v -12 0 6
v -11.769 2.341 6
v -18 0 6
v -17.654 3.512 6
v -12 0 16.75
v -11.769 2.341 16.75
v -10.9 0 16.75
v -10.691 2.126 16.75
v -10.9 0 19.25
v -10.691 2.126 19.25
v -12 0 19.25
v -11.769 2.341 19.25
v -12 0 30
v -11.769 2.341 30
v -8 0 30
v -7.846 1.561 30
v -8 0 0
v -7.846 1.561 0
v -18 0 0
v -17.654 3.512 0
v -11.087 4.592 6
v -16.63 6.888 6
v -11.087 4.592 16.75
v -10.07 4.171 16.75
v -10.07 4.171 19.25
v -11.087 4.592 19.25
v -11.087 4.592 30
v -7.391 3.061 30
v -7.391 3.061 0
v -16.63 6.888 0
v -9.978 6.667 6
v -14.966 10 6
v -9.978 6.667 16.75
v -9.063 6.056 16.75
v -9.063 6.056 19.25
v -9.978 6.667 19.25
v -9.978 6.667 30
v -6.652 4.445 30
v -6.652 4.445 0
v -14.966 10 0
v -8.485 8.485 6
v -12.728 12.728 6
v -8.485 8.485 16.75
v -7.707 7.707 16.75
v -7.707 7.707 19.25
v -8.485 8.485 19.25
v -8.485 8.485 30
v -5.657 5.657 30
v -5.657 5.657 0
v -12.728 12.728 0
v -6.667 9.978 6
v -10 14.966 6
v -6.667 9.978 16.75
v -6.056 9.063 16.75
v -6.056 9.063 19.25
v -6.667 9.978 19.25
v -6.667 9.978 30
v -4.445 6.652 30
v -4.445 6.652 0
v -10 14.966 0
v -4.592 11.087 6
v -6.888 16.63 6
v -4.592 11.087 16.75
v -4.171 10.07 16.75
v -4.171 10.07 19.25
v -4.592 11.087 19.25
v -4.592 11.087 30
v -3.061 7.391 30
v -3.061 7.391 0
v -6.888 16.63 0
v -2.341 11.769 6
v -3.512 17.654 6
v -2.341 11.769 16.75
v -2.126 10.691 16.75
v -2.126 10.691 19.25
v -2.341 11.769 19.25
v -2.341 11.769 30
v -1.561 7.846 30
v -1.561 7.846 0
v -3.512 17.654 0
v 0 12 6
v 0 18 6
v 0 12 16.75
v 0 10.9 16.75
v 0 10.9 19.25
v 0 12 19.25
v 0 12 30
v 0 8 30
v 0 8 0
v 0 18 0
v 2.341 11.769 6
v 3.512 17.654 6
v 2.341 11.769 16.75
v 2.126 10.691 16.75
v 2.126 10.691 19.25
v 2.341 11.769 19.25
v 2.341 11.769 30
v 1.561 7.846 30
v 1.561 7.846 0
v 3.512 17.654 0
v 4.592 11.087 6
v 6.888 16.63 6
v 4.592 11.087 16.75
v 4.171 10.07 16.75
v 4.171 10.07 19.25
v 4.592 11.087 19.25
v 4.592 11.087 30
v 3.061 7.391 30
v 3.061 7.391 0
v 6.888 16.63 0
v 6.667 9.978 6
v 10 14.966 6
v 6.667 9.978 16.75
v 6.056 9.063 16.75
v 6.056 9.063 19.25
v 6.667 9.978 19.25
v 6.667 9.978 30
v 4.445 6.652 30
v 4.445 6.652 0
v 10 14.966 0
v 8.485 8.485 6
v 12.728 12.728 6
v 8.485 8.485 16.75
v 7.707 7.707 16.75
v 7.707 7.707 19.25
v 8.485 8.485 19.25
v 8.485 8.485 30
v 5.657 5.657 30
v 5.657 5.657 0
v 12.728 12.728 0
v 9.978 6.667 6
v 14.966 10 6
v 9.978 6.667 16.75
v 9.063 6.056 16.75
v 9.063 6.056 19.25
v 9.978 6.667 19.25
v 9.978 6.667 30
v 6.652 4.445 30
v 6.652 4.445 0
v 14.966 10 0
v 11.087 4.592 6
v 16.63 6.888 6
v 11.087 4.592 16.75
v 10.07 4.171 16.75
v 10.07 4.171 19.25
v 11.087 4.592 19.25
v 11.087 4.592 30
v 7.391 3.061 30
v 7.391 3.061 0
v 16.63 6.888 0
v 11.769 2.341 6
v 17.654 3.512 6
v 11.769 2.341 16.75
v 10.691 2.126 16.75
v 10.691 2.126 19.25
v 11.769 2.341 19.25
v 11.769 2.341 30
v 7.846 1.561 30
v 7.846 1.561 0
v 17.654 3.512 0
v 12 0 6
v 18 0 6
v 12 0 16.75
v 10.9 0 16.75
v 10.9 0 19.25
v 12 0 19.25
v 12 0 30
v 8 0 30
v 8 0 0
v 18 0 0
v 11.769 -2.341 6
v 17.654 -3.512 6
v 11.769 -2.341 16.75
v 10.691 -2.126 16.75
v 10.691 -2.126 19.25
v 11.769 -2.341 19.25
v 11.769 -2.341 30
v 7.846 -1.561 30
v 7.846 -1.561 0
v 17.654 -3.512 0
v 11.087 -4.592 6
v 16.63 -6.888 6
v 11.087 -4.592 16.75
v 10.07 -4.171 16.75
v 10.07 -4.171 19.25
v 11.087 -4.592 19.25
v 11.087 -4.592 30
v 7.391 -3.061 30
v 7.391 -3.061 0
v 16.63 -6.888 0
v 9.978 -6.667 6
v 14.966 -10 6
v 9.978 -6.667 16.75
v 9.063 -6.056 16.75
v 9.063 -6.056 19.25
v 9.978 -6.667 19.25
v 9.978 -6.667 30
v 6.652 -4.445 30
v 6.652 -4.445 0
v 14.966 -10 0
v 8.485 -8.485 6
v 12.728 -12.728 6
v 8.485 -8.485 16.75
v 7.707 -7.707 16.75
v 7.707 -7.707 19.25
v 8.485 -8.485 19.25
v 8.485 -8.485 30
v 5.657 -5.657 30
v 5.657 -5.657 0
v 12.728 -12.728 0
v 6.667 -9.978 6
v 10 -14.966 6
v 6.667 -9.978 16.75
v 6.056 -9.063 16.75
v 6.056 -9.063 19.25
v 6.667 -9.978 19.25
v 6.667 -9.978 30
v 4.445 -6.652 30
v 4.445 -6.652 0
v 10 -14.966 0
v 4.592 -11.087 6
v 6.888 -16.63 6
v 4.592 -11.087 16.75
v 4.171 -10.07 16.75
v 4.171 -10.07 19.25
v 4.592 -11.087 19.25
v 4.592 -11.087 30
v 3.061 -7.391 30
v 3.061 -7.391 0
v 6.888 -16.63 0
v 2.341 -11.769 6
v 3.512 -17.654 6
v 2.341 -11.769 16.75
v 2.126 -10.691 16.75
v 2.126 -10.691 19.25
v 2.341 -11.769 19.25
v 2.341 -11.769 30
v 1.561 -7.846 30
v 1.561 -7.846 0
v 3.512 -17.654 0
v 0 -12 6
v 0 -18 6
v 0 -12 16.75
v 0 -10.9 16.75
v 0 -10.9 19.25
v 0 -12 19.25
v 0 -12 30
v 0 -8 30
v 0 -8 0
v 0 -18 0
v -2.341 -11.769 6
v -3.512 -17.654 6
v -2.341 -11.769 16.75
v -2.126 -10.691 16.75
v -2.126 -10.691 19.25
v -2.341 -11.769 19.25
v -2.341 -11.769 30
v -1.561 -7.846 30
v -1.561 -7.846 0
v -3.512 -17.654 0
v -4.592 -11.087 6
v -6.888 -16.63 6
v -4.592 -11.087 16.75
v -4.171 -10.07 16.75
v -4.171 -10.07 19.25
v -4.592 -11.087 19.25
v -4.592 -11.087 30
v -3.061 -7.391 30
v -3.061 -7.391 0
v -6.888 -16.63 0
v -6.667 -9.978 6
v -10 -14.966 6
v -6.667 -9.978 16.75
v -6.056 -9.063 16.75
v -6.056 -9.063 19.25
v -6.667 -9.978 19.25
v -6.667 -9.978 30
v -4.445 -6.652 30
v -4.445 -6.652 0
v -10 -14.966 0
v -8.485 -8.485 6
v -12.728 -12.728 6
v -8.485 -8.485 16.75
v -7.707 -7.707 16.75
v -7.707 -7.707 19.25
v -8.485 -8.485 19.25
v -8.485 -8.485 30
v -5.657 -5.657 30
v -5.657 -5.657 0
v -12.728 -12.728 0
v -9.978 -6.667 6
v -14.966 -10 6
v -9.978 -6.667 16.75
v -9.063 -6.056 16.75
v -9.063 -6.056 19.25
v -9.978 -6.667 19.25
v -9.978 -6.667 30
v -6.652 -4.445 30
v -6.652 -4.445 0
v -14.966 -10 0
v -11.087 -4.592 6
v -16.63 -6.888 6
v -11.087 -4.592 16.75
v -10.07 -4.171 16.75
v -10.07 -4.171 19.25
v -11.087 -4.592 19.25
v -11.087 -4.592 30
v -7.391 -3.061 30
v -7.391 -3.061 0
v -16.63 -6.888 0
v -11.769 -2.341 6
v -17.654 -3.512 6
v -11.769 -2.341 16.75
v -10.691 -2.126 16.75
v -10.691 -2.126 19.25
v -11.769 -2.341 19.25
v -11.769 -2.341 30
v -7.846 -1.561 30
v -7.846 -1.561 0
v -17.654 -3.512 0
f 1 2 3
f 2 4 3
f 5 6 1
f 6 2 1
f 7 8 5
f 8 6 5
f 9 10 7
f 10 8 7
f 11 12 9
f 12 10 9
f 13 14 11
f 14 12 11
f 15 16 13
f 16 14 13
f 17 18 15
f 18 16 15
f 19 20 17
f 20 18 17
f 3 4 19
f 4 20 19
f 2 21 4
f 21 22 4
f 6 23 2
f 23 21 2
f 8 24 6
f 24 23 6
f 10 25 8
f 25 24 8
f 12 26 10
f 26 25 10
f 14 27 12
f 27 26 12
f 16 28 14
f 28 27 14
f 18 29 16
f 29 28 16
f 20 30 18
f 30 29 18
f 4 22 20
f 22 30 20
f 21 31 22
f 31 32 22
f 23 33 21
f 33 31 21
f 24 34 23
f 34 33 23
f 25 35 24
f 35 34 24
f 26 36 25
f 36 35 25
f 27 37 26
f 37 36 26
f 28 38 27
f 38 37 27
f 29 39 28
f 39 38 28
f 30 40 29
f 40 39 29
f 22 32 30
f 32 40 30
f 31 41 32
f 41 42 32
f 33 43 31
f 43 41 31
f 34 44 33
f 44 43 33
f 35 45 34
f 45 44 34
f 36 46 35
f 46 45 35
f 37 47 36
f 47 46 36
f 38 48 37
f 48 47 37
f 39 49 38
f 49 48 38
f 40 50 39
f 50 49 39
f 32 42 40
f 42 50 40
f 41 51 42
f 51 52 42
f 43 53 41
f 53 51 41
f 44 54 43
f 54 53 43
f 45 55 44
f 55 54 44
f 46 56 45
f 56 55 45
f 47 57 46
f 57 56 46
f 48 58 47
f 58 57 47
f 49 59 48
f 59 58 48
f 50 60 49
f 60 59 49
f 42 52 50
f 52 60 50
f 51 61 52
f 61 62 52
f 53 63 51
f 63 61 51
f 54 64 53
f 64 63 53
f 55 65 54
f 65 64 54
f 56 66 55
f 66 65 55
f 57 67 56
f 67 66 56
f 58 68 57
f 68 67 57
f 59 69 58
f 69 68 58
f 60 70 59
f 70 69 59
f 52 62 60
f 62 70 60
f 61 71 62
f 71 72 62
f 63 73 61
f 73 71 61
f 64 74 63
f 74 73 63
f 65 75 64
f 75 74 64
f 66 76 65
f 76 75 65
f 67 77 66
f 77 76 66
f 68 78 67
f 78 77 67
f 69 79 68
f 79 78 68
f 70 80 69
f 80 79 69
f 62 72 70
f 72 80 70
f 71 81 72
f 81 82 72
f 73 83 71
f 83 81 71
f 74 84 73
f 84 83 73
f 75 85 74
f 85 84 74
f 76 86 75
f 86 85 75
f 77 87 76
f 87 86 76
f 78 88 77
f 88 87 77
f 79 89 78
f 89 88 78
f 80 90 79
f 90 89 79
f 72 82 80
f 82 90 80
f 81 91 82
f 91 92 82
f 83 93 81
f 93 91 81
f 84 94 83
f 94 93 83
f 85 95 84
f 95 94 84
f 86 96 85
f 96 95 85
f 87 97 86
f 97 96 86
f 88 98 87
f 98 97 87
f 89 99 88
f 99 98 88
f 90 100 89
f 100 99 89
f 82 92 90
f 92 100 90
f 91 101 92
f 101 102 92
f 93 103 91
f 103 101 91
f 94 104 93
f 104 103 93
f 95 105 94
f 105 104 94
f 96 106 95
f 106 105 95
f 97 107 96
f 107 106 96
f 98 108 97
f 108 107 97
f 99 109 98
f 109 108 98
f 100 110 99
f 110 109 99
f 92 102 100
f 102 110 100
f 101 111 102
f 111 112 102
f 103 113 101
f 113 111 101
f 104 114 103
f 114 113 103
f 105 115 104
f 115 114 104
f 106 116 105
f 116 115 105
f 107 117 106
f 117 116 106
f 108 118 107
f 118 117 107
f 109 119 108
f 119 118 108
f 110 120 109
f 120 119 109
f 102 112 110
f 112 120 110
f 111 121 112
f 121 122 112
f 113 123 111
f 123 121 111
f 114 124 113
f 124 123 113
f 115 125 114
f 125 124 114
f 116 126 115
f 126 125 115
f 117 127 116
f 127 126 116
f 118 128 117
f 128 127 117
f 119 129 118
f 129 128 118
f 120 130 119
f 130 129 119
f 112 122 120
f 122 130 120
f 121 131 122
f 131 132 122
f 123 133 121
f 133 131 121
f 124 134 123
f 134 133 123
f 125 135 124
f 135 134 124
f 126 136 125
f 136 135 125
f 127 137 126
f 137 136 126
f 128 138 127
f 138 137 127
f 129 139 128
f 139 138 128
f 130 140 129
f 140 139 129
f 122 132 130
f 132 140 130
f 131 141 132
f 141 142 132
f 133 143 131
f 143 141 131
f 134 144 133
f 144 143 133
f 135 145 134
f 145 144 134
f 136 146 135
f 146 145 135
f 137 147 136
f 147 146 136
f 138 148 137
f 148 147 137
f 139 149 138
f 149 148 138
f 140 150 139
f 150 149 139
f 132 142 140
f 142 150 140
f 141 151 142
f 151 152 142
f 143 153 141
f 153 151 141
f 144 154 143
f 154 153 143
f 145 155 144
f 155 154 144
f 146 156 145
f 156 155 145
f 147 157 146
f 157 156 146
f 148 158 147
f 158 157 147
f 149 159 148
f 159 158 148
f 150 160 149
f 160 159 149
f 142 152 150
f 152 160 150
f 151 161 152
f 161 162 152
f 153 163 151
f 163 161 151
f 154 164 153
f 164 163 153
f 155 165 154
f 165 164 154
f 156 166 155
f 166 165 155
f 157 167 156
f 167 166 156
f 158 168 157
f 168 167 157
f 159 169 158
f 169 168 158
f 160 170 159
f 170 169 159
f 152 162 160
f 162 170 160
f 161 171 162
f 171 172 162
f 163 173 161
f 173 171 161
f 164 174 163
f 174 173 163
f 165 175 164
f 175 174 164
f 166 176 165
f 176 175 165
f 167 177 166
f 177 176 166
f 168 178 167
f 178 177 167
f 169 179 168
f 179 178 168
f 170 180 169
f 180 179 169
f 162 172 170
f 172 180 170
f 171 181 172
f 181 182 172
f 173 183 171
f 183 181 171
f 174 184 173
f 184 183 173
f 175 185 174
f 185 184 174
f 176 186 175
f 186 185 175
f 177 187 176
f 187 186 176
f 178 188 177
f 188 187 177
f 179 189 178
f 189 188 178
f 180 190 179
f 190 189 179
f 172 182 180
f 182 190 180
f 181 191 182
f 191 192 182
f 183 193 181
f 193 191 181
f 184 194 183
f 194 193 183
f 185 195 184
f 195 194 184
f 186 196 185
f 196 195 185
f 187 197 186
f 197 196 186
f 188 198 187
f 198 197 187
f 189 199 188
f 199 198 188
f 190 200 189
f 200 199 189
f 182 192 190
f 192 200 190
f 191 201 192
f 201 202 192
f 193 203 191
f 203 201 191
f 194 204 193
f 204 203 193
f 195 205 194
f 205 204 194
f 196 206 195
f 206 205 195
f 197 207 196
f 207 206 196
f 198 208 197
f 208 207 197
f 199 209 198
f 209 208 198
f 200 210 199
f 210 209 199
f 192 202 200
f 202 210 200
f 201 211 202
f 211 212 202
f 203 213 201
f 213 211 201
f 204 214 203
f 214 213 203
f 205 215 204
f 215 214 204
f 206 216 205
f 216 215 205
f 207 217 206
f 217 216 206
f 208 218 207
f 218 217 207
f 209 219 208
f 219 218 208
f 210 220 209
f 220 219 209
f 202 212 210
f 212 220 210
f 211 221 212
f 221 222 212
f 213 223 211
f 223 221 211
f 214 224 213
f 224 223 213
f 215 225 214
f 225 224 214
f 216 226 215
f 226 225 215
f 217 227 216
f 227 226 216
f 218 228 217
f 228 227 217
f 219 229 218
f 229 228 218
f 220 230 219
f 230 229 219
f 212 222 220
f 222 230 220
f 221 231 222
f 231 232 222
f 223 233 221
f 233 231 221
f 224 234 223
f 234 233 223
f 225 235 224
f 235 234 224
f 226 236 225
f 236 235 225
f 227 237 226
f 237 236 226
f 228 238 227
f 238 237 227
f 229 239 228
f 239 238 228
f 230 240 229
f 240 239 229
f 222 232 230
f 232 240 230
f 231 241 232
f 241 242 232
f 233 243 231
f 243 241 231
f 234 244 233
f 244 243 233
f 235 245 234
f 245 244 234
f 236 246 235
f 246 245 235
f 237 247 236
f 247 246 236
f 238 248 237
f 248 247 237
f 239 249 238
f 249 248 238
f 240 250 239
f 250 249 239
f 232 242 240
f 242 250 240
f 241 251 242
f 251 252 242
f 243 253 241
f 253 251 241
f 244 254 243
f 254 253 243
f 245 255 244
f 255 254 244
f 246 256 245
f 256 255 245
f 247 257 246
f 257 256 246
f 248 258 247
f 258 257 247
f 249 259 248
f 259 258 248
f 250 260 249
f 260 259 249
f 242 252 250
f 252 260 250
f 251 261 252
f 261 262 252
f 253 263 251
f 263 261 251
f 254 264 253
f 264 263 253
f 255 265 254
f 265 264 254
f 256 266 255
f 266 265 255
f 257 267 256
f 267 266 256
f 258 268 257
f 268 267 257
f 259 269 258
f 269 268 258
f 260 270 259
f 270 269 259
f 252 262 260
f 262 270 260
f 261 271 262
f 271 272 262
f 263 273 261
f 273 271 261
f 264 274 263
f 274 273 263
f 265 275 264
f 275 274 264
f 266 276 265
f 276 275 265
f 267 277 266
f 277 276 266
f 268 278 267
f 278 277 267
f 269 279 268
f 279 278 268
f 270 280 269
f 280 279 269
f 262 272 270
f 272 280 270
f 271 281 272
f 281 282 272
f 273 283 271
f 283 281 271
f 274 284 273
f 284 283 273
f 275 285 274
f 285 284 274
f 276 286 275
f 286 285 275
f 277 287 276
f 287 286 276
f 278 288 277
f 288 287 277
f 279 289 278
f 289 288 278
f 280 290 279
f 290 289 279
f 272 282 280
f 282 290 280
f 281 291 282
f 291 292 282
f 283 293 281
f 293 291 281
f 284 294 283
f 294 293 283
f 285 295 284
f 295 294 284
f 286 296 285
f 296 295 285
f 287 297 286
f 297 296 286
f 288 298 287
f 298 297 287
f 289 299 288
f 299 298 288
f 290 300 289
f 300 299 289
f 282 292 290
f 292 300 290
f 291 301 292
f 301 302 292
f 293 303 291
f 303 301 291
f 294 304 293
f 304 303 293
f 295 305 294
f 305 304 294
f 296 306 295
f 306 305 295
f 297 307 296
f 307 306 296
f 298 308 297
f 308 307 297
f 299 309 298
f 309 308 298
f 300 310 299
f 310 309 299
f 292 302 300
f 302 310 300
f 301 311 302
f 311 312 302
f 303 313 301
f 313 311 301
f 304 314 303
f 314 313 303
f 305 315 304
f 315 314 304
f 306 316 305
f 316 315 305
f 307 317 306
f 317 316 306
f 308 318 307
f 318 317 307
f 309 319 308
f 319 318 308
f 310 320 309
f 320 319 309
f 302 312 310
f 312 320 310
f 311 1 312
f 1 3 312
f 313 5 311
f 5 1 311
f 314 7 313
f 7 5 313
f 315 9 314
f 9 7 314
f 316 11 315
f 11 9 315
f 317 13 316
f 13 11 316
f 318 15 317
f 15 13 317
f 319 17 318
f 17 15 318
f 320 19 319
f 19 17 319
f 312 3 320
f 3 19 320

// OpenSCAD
$fn = 32;

// ----------------------------------------------------------------------
// Grooved revolve: flanged, bore R8
// ----------------------------------------------------------------------

// --- parameters (mm) ---
bore_r = 8;               // bore radius
outer_r = 12;             // outer radius of the body
total_h = 30;             // overall height, Z
wall = 4;                 // radial wall thickness
groove_w = 2.5;           // groove width
groove_d = 1.1;           // groove depth
grooves = 1;              // number of outer grooves
flange_r = 18;            // flange radius
flange_h = 6;             // flange height

bbox_x = 2 * flange_r;  // full diameter
bore_d = 2 * bore_r;  // bore diameter
body_d = 2 * outer_r;  // body diameter
flange_d = 2 * flange_r;  // flange diameter
revolve_angle = 360;  // full turn around the Z axis

profile = [[8, 0], [12, 0], [18, 0], [18, 6], [12, 6], [12, 16.75], [10.9, 16.75], [10.9, 19.25], [12, 19.25], [12, 30], [8, 30]];  // primary outline, 11 points, counter clockwise

// --- the one profile operation ---
rotate_extrude(angle = revolve_angle) polygon(points = profile);
